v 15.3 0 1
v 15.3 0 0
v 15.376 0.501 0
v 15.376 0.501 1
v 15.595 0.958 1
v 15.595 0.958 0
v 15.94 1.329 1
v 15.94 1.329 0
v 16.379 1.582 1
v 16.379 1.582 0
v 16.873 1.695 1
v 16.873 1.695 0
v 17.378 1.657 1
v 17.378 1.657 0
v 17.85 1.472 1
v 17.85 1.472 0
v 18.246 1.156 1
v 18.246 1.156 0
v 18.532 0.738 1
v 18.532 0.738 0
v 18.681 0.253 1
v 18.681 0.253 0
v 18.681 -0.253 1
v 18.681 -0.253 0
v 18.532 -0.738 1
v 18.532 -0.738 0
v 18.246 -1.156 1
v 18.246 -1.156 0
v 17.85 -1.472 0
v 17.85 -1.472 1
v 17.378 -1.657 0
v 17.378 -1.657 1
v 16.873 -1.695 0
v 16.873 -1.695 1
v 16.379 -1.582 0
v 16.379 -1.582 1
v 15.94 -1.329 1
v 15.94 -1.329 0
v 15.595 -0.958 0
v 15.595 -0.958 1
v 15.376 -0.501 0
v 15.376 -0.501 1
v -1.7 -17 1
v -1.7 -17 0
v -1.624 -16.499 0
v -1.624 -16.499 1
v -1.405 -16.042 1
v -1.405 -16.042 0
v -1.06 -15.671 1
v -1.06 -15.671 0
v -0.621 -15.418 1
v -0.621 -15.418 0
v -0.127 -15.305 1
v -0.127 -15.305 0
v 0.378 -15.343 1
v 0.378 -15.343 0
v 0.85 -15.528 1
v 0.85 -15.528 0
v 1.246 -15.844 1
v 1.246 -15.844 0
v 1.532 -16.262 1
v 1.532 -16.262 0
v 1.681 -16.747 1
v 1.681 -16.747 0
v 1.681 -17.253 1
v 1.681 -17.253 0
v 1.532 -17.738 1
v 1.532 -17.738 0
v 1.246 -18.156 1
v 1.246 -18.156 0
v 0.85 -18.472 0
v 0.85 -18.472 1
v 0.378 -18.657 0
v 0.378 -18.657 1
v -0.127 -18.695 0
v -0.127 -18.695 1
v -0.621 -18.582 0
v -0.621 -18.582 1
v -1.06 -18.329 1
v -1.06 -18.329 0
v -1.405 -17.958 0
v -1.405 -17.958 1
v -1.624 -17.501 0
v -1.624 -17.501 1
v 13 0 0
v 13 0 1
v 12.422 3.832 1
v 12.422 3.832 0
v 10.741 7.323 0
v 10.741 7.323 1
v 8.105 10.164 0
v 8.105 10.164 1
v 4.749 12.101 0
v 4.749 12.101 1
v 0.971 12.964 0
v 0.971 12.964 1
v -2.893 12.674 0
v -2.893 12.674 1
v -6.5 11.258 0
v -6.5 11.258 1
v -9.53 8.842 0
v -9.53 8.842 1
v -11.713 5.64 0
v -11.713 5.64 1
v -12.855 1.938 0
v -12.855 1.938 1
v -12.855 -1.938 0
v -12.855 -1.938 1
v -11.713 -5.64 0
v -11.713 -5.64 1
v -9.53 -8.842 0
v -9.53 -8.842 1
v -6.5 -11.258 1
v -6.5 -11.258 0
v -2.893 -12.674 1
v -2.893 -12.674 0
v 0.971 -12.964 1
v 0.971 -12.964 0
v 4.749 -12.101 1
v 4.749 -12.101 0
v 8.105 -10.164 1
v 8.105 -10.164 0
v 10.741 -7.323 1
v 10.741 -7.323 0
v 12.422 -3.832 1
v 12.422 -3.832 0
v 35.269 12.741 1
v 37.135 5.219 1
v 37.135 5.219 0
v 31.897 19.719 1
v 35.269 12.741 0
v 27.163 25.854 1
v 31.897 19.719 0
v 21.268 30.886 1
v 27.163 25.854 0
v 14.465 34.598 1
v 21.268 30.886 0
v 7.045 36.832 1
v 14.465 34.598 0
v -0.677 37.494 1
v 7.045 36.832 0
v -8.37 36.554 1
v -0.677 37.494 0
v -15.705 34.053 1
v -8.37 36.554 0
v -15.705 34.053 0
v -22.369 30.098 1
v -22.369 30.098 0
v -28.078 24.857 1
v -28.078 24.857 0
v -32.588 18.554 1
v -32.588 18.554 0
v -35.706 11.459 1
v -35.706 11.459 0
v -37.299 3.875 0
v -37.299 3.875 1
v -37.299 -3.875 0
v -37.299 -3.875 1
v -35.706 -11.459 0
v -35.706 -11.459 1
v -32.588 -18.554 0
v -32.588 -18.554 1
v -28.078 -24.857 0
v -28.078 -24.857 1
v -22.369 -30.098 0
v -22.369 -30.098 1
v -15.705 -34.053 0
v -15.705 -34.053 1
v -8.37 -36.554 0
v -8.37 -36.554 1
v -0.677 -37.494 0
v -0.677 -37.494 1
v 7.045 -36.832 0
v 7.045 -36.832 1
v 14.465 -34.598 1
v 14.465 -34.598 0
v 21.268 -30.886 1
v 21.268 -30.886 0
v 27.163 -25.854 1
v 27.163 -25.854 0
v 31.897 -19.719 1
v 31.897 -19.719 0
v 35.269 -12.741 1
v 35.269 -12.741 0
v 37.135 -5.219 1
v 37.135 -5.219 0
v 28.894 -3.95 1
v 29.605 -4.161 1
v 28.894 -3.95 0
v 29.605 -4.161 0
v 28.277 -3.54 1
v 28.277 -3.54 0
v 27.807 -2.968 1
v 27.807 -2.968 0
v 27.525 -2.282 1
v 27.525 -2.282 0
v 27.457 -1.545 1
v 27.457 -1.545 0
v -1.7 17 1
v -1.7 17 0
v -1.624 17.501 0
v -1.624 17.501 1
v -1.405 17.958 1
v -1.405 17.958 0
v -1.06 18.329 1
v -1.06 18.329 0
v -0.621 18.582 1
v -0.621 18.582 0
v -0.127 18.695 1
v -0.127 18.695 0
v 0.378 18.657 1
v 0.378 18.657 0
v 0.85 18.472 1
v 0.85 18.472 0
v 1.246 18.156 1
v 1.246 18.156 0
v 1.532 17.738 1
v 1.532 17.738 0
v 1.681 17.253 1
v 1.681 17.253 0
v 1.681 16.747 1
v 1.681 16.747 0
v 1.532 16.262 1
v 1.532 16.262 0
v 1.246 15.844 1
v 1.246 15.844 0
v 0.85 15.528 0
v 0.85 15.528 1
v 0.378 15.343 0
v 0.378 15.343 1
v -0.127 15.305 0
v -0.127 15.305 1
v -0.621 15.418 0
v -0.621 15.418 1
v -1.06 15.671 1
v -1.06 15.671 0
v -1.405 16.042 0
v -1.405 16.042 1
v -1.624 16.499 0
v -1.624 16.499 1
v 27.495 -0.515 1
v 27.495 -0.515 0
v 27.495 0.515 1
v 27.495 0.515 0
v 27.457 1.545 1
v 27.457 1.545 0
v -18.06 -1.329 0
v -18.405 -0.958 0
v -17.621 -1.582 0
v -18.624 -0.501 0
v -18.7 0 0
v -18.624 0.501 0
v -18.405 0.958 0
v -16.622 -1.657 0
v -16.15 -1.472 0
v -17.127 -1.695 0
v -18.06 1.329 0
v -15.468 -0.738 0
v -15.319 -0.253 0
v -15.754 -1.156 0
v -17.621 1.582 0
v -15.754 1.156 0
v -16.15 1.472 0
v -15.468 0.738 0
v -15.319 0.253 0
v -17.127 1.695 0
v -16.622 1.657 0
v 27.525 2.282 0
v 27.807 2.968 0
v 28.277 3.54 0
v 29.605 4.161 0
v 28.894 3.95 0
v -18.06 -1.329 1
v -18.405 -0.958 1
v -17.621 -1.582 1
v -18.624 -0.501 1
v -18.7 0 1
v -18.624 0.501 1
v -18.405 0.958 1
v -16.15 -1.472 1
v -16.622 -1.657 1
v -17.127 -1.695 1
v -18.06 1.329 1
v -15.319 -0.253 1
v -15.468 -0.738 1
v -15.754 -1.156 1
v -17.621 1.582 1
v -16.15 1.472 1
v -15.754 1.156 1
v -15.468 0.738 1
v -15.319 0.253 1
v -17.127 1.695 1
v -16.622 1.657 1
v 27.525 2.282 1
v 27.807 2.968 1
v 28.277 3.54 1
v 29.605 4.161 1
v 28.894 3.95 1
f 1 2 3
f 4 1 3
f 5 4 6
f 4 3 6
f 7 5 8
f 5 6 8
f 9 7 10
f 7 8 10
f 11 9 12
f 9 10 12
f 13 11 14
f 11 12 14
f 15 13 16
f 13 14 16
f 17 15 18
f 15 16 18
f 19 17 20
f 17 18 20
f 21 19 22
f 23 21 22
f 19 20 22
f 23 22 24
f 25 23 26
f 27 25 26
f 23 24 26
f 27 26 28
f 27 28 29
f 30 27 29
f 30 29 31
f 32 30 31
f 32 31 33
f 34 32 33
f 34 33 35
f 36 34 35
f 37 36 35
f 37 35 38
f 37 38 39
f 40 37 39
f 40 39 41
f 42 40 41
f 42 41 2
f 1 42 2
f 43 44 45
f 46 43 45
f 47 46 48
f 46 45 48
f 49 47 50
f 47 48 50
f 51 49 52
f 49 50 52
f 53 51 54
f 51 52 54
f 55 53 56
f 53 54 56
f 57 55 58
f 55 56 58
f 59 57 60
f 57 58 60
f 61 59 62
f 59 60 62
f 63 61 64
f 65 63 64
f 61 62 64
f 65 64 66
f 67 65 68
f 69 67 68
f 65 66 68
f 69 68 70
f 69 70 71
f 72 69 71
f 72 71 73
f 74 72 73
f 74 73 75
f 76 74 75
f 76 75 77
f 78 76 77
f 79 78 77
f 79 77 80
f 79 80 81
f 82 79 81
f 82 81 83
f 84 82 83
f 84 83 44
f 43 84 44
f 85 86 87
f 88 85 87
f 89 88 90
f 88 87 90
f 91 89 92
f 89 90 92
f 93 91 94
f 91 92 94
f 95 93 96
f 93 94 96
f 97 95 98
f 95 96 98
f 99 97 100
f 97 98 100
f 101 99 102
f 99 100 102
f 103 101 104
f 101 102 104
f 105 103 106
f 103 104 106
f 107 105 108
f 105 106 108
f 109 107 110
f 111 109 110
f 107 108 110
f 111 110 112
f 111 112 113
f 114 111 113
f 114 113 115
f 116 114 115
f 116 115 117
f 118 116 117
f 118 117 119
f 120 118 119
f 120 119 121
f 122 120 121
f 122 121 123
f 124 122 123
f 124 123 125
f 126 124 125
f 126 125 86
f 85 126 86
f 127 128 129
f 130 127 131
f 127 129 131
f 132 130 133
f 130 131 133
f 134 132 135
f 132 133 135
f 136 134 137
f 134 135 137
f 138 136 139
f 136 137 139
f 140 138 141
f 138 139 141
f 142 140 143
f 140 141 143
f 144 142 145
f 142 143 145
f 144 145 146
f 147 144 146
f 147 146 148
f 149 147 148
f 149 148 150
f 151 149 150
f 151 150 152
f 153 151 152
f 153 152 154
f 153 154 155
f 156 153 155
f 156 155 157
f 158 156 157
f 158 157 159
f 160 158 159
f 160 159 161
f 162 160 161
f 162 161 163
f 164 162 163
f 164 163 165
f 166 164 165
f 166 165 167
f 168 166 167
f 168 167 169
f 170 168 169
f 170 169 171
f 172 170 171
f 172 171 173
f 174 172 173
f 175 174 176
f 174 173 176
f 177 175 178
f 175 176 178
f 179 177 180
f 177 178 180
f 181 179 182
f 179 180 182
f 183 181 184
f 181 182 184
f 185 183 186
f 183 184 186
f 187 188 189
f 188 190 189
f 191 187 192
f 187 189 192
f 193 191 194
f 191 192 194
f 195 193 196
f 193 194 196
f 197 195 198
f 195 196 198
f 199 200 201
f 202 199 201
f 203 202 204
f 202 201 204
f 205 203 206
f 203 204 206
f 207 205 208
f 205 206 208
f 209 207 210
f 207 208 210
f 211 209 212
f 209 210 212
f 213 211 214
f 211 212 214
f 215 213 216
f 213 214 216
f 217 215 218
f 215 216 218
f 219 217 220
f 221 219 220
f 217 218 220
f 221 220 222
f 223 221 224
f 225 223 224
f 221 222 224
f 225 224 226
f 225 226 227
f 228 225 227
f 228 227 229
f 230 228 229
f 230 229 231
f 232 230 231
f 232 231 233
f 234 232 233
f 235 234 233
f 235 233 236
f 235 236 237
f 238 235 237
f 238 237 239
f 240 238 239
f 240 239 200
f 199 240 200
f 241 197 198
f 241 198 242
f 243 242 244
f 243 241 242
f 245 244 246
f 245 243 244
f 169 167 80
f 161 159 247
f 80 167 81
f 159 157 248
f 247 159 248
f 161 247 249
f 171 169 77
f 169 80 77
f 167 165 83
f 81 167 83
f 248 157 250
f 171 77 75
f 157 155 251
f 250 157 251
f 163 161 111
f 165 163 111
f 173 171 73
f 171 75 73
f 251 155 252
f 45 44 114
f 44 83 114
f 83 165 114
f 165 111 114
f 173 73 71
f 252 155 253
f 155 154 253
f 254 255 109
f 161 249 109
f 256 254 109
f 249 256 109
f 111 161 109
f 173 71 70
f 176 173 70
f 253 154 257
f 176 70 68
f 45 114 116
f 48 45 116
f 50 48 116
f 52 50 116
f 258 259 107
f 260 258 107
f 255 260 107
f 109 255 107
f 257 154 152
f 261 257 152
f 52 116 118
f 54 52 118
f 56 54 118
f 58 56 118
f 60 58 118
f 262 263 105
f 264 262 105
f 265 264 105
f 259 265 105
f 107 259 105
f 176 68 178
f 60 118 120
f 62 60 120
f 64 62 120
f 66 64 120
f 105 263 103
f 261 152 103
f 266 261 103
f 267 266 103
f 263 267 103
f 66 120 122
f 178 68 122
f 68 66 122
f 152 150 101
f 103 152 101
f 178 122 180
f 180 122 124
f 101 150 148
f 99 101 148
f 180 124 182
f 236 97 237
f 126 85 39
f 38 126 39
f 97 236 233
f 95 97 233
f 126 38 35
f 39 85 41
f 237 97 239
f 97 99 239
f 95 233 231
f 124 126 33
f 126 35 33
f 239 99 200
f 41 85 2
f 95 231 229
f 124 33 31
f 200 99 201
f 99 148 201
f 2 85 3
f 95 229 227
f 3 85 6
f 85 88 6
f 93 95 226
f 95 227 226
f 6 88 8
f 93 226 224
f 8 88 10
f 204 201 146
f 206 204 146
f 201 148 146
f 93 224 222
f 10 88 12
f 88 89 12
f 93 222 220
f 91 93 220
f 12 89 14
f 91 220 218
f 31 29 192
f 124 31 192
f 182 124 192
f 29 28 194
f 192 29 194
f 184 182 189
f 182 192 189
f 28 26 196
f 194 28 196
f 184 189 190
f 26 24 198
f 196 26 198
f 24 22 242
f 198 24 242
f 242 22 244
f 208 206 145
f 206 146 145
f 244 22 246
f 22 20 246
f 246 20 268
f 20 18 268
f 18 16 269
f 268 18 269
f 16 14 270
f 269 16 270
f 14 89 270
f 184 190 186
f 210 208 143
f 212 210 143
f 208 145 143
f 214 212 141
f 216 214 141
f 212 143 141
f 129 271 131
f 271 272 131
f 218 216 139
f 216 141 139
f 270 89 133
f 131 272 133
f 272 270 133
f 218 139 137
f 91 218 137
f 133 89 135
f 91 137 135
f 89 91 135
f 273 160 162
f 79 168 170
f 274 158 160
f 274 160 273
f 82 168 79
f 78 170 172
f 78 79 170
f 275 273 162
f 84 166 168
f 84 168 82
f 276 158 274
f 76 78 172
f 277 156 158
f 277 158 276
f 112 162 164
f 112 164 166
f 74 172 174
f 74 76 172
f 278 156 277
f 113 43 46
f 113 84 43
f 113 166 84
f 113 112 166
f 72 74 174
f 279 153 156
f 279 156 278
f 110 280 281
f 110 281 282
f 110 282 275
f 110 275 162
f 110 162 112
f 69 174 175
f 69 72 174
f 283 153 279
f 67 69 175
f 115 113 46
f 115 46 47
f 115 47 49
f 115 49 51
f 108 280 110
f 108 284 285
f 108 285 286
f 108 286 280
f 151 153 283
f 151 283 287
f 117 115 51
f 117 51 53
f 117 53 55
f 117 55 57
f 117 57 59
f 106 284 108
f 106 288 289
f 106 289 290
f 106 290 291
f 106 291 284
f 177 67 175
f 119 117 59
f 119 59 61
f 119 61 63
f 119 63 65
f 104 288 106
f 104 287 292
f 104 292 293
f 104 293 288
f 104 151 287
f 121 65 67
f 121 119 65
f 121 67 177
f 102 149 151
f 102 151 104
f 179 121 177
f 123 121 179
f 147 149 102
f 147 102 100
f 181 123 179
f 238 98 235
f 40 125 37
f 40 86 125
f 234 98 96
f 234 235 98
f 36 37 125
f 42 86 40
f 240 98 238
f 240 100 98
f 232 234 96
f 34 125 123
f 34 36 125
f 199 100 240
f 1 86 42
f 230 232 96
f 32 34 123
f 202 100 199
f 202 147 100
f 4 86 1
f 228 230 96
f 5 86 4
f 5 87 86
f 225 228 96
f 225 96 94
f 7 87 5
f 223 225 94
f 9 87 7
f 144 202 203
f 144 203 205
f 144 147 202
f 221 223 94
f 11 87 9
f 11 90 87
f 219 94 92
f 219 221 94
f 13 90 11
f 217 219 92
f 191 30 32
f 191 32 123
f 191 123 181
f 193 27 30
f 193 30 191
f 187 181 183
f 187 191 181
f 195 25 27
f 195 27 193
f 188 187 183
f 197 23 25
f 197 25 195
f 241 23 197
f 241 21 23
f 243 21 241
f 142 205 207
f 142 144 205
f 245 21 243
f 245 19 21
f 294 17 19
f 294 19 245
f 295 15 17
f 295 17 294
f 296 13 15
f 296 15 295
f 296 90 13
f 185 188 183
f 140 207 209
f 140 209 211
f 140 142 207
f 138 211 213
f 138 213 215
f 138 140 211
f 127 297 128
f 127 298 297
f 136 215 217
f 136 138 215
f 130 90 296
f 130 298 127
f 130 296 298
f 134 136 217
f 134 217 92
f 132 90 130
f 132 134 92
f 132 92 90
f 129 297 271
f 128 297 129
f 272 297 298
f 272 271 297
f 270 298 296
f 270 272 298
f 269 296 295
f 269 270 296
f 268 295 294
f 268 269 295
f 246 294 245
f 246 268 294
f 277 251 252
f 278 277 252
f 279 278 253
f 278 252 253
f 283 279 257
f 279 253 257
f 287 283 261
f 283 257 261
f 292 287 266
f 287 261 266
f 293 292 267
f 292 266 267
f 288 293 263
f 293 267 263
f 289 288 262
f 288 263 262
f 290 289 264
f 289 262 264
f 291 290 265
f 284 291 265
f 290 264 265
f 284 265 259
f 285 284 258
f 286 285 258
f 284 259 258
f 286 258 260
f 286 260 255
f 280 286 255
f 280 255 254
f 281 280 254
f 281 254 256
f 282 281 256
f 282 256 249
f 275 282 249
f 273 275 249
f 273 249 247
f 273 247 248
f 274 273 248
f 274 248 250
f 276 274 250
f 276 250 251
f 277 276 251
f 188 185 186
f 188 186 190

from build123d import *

# Parameters (mm, degrees)
SKETCH1_R                   = 37.5
BOSS_EXTRUDE1_DEPTH         = 1
SKETCH2_R                   = 13
CUT_EXTRUDE1_DEPTH          = 54.042435842
TAP_DRILL_FOR_M3X0_5_TAP1_D = 3.4
CUT_EXTRUDE2_DEPTH          = 54.042435842
FILLET1_R                   = 2.5


with BuildPart() as part:
    # Sketch1 → Boss-Extrude1 (new body)
    with BuildSketch(Plane.XY):
        Circle(SKETCH1_R)
    extrude(amount=BOSS_EXTRUDE1_DEPTH)

    # Sketch2 → Cut-Extrude1 (cut, through all)
    with BuildSketch(Plane.XY.offset(1)):
        Circle(SKETCH2_R)
    extrude(amount=-CUT_EXTRUDE1_DEPTH, mode=Mode.SUBTRACT)

    # Tap Drill for M3x0.5 Tap1 (through all)
    with Locations(Plane.XY.offset(1)):
        with Locations((0, 17), (17, 0), (0, -17), (-17, 0)):
            Hole(TAP_DRILL_FOR_M3X0_5_TAP1_D / 2)

    # Sketch5 → Cut-Extrude2 (cut, through all)
    with BuildSketch(Plane.XY.offset(1)):
        with BuildLine():
            Line((27.23237189, 3.827260276), (37.135052578, 5.218991286))
            ThreePointArc((37.135052578, 5.218991286), (37.5, 0), (37.135052578, -5.218991286))
            Line((37.135052578, -5.218991286), (27.23237189, -3.827260276))
            ThreePointArc((27.23237189, -3.827260276), (27.5, 0), (27.23237189, 3.827260276))
        make_face()
    extrude(amount=-CUT_EXTRUDE2_DEPTH, mode=Mode.SUBTRACT)

    # Fillet1
    fillet1_edges = [part.edges().sort_by_distance(p)[0] for p in [
        (27.23237189, -3.827260276, 0.5),
        (27.23237189, 3.827260276, 0.5),
    ]]
    fillet(fillet1_edges, radius=FILLET1_R)


solid = part.part
